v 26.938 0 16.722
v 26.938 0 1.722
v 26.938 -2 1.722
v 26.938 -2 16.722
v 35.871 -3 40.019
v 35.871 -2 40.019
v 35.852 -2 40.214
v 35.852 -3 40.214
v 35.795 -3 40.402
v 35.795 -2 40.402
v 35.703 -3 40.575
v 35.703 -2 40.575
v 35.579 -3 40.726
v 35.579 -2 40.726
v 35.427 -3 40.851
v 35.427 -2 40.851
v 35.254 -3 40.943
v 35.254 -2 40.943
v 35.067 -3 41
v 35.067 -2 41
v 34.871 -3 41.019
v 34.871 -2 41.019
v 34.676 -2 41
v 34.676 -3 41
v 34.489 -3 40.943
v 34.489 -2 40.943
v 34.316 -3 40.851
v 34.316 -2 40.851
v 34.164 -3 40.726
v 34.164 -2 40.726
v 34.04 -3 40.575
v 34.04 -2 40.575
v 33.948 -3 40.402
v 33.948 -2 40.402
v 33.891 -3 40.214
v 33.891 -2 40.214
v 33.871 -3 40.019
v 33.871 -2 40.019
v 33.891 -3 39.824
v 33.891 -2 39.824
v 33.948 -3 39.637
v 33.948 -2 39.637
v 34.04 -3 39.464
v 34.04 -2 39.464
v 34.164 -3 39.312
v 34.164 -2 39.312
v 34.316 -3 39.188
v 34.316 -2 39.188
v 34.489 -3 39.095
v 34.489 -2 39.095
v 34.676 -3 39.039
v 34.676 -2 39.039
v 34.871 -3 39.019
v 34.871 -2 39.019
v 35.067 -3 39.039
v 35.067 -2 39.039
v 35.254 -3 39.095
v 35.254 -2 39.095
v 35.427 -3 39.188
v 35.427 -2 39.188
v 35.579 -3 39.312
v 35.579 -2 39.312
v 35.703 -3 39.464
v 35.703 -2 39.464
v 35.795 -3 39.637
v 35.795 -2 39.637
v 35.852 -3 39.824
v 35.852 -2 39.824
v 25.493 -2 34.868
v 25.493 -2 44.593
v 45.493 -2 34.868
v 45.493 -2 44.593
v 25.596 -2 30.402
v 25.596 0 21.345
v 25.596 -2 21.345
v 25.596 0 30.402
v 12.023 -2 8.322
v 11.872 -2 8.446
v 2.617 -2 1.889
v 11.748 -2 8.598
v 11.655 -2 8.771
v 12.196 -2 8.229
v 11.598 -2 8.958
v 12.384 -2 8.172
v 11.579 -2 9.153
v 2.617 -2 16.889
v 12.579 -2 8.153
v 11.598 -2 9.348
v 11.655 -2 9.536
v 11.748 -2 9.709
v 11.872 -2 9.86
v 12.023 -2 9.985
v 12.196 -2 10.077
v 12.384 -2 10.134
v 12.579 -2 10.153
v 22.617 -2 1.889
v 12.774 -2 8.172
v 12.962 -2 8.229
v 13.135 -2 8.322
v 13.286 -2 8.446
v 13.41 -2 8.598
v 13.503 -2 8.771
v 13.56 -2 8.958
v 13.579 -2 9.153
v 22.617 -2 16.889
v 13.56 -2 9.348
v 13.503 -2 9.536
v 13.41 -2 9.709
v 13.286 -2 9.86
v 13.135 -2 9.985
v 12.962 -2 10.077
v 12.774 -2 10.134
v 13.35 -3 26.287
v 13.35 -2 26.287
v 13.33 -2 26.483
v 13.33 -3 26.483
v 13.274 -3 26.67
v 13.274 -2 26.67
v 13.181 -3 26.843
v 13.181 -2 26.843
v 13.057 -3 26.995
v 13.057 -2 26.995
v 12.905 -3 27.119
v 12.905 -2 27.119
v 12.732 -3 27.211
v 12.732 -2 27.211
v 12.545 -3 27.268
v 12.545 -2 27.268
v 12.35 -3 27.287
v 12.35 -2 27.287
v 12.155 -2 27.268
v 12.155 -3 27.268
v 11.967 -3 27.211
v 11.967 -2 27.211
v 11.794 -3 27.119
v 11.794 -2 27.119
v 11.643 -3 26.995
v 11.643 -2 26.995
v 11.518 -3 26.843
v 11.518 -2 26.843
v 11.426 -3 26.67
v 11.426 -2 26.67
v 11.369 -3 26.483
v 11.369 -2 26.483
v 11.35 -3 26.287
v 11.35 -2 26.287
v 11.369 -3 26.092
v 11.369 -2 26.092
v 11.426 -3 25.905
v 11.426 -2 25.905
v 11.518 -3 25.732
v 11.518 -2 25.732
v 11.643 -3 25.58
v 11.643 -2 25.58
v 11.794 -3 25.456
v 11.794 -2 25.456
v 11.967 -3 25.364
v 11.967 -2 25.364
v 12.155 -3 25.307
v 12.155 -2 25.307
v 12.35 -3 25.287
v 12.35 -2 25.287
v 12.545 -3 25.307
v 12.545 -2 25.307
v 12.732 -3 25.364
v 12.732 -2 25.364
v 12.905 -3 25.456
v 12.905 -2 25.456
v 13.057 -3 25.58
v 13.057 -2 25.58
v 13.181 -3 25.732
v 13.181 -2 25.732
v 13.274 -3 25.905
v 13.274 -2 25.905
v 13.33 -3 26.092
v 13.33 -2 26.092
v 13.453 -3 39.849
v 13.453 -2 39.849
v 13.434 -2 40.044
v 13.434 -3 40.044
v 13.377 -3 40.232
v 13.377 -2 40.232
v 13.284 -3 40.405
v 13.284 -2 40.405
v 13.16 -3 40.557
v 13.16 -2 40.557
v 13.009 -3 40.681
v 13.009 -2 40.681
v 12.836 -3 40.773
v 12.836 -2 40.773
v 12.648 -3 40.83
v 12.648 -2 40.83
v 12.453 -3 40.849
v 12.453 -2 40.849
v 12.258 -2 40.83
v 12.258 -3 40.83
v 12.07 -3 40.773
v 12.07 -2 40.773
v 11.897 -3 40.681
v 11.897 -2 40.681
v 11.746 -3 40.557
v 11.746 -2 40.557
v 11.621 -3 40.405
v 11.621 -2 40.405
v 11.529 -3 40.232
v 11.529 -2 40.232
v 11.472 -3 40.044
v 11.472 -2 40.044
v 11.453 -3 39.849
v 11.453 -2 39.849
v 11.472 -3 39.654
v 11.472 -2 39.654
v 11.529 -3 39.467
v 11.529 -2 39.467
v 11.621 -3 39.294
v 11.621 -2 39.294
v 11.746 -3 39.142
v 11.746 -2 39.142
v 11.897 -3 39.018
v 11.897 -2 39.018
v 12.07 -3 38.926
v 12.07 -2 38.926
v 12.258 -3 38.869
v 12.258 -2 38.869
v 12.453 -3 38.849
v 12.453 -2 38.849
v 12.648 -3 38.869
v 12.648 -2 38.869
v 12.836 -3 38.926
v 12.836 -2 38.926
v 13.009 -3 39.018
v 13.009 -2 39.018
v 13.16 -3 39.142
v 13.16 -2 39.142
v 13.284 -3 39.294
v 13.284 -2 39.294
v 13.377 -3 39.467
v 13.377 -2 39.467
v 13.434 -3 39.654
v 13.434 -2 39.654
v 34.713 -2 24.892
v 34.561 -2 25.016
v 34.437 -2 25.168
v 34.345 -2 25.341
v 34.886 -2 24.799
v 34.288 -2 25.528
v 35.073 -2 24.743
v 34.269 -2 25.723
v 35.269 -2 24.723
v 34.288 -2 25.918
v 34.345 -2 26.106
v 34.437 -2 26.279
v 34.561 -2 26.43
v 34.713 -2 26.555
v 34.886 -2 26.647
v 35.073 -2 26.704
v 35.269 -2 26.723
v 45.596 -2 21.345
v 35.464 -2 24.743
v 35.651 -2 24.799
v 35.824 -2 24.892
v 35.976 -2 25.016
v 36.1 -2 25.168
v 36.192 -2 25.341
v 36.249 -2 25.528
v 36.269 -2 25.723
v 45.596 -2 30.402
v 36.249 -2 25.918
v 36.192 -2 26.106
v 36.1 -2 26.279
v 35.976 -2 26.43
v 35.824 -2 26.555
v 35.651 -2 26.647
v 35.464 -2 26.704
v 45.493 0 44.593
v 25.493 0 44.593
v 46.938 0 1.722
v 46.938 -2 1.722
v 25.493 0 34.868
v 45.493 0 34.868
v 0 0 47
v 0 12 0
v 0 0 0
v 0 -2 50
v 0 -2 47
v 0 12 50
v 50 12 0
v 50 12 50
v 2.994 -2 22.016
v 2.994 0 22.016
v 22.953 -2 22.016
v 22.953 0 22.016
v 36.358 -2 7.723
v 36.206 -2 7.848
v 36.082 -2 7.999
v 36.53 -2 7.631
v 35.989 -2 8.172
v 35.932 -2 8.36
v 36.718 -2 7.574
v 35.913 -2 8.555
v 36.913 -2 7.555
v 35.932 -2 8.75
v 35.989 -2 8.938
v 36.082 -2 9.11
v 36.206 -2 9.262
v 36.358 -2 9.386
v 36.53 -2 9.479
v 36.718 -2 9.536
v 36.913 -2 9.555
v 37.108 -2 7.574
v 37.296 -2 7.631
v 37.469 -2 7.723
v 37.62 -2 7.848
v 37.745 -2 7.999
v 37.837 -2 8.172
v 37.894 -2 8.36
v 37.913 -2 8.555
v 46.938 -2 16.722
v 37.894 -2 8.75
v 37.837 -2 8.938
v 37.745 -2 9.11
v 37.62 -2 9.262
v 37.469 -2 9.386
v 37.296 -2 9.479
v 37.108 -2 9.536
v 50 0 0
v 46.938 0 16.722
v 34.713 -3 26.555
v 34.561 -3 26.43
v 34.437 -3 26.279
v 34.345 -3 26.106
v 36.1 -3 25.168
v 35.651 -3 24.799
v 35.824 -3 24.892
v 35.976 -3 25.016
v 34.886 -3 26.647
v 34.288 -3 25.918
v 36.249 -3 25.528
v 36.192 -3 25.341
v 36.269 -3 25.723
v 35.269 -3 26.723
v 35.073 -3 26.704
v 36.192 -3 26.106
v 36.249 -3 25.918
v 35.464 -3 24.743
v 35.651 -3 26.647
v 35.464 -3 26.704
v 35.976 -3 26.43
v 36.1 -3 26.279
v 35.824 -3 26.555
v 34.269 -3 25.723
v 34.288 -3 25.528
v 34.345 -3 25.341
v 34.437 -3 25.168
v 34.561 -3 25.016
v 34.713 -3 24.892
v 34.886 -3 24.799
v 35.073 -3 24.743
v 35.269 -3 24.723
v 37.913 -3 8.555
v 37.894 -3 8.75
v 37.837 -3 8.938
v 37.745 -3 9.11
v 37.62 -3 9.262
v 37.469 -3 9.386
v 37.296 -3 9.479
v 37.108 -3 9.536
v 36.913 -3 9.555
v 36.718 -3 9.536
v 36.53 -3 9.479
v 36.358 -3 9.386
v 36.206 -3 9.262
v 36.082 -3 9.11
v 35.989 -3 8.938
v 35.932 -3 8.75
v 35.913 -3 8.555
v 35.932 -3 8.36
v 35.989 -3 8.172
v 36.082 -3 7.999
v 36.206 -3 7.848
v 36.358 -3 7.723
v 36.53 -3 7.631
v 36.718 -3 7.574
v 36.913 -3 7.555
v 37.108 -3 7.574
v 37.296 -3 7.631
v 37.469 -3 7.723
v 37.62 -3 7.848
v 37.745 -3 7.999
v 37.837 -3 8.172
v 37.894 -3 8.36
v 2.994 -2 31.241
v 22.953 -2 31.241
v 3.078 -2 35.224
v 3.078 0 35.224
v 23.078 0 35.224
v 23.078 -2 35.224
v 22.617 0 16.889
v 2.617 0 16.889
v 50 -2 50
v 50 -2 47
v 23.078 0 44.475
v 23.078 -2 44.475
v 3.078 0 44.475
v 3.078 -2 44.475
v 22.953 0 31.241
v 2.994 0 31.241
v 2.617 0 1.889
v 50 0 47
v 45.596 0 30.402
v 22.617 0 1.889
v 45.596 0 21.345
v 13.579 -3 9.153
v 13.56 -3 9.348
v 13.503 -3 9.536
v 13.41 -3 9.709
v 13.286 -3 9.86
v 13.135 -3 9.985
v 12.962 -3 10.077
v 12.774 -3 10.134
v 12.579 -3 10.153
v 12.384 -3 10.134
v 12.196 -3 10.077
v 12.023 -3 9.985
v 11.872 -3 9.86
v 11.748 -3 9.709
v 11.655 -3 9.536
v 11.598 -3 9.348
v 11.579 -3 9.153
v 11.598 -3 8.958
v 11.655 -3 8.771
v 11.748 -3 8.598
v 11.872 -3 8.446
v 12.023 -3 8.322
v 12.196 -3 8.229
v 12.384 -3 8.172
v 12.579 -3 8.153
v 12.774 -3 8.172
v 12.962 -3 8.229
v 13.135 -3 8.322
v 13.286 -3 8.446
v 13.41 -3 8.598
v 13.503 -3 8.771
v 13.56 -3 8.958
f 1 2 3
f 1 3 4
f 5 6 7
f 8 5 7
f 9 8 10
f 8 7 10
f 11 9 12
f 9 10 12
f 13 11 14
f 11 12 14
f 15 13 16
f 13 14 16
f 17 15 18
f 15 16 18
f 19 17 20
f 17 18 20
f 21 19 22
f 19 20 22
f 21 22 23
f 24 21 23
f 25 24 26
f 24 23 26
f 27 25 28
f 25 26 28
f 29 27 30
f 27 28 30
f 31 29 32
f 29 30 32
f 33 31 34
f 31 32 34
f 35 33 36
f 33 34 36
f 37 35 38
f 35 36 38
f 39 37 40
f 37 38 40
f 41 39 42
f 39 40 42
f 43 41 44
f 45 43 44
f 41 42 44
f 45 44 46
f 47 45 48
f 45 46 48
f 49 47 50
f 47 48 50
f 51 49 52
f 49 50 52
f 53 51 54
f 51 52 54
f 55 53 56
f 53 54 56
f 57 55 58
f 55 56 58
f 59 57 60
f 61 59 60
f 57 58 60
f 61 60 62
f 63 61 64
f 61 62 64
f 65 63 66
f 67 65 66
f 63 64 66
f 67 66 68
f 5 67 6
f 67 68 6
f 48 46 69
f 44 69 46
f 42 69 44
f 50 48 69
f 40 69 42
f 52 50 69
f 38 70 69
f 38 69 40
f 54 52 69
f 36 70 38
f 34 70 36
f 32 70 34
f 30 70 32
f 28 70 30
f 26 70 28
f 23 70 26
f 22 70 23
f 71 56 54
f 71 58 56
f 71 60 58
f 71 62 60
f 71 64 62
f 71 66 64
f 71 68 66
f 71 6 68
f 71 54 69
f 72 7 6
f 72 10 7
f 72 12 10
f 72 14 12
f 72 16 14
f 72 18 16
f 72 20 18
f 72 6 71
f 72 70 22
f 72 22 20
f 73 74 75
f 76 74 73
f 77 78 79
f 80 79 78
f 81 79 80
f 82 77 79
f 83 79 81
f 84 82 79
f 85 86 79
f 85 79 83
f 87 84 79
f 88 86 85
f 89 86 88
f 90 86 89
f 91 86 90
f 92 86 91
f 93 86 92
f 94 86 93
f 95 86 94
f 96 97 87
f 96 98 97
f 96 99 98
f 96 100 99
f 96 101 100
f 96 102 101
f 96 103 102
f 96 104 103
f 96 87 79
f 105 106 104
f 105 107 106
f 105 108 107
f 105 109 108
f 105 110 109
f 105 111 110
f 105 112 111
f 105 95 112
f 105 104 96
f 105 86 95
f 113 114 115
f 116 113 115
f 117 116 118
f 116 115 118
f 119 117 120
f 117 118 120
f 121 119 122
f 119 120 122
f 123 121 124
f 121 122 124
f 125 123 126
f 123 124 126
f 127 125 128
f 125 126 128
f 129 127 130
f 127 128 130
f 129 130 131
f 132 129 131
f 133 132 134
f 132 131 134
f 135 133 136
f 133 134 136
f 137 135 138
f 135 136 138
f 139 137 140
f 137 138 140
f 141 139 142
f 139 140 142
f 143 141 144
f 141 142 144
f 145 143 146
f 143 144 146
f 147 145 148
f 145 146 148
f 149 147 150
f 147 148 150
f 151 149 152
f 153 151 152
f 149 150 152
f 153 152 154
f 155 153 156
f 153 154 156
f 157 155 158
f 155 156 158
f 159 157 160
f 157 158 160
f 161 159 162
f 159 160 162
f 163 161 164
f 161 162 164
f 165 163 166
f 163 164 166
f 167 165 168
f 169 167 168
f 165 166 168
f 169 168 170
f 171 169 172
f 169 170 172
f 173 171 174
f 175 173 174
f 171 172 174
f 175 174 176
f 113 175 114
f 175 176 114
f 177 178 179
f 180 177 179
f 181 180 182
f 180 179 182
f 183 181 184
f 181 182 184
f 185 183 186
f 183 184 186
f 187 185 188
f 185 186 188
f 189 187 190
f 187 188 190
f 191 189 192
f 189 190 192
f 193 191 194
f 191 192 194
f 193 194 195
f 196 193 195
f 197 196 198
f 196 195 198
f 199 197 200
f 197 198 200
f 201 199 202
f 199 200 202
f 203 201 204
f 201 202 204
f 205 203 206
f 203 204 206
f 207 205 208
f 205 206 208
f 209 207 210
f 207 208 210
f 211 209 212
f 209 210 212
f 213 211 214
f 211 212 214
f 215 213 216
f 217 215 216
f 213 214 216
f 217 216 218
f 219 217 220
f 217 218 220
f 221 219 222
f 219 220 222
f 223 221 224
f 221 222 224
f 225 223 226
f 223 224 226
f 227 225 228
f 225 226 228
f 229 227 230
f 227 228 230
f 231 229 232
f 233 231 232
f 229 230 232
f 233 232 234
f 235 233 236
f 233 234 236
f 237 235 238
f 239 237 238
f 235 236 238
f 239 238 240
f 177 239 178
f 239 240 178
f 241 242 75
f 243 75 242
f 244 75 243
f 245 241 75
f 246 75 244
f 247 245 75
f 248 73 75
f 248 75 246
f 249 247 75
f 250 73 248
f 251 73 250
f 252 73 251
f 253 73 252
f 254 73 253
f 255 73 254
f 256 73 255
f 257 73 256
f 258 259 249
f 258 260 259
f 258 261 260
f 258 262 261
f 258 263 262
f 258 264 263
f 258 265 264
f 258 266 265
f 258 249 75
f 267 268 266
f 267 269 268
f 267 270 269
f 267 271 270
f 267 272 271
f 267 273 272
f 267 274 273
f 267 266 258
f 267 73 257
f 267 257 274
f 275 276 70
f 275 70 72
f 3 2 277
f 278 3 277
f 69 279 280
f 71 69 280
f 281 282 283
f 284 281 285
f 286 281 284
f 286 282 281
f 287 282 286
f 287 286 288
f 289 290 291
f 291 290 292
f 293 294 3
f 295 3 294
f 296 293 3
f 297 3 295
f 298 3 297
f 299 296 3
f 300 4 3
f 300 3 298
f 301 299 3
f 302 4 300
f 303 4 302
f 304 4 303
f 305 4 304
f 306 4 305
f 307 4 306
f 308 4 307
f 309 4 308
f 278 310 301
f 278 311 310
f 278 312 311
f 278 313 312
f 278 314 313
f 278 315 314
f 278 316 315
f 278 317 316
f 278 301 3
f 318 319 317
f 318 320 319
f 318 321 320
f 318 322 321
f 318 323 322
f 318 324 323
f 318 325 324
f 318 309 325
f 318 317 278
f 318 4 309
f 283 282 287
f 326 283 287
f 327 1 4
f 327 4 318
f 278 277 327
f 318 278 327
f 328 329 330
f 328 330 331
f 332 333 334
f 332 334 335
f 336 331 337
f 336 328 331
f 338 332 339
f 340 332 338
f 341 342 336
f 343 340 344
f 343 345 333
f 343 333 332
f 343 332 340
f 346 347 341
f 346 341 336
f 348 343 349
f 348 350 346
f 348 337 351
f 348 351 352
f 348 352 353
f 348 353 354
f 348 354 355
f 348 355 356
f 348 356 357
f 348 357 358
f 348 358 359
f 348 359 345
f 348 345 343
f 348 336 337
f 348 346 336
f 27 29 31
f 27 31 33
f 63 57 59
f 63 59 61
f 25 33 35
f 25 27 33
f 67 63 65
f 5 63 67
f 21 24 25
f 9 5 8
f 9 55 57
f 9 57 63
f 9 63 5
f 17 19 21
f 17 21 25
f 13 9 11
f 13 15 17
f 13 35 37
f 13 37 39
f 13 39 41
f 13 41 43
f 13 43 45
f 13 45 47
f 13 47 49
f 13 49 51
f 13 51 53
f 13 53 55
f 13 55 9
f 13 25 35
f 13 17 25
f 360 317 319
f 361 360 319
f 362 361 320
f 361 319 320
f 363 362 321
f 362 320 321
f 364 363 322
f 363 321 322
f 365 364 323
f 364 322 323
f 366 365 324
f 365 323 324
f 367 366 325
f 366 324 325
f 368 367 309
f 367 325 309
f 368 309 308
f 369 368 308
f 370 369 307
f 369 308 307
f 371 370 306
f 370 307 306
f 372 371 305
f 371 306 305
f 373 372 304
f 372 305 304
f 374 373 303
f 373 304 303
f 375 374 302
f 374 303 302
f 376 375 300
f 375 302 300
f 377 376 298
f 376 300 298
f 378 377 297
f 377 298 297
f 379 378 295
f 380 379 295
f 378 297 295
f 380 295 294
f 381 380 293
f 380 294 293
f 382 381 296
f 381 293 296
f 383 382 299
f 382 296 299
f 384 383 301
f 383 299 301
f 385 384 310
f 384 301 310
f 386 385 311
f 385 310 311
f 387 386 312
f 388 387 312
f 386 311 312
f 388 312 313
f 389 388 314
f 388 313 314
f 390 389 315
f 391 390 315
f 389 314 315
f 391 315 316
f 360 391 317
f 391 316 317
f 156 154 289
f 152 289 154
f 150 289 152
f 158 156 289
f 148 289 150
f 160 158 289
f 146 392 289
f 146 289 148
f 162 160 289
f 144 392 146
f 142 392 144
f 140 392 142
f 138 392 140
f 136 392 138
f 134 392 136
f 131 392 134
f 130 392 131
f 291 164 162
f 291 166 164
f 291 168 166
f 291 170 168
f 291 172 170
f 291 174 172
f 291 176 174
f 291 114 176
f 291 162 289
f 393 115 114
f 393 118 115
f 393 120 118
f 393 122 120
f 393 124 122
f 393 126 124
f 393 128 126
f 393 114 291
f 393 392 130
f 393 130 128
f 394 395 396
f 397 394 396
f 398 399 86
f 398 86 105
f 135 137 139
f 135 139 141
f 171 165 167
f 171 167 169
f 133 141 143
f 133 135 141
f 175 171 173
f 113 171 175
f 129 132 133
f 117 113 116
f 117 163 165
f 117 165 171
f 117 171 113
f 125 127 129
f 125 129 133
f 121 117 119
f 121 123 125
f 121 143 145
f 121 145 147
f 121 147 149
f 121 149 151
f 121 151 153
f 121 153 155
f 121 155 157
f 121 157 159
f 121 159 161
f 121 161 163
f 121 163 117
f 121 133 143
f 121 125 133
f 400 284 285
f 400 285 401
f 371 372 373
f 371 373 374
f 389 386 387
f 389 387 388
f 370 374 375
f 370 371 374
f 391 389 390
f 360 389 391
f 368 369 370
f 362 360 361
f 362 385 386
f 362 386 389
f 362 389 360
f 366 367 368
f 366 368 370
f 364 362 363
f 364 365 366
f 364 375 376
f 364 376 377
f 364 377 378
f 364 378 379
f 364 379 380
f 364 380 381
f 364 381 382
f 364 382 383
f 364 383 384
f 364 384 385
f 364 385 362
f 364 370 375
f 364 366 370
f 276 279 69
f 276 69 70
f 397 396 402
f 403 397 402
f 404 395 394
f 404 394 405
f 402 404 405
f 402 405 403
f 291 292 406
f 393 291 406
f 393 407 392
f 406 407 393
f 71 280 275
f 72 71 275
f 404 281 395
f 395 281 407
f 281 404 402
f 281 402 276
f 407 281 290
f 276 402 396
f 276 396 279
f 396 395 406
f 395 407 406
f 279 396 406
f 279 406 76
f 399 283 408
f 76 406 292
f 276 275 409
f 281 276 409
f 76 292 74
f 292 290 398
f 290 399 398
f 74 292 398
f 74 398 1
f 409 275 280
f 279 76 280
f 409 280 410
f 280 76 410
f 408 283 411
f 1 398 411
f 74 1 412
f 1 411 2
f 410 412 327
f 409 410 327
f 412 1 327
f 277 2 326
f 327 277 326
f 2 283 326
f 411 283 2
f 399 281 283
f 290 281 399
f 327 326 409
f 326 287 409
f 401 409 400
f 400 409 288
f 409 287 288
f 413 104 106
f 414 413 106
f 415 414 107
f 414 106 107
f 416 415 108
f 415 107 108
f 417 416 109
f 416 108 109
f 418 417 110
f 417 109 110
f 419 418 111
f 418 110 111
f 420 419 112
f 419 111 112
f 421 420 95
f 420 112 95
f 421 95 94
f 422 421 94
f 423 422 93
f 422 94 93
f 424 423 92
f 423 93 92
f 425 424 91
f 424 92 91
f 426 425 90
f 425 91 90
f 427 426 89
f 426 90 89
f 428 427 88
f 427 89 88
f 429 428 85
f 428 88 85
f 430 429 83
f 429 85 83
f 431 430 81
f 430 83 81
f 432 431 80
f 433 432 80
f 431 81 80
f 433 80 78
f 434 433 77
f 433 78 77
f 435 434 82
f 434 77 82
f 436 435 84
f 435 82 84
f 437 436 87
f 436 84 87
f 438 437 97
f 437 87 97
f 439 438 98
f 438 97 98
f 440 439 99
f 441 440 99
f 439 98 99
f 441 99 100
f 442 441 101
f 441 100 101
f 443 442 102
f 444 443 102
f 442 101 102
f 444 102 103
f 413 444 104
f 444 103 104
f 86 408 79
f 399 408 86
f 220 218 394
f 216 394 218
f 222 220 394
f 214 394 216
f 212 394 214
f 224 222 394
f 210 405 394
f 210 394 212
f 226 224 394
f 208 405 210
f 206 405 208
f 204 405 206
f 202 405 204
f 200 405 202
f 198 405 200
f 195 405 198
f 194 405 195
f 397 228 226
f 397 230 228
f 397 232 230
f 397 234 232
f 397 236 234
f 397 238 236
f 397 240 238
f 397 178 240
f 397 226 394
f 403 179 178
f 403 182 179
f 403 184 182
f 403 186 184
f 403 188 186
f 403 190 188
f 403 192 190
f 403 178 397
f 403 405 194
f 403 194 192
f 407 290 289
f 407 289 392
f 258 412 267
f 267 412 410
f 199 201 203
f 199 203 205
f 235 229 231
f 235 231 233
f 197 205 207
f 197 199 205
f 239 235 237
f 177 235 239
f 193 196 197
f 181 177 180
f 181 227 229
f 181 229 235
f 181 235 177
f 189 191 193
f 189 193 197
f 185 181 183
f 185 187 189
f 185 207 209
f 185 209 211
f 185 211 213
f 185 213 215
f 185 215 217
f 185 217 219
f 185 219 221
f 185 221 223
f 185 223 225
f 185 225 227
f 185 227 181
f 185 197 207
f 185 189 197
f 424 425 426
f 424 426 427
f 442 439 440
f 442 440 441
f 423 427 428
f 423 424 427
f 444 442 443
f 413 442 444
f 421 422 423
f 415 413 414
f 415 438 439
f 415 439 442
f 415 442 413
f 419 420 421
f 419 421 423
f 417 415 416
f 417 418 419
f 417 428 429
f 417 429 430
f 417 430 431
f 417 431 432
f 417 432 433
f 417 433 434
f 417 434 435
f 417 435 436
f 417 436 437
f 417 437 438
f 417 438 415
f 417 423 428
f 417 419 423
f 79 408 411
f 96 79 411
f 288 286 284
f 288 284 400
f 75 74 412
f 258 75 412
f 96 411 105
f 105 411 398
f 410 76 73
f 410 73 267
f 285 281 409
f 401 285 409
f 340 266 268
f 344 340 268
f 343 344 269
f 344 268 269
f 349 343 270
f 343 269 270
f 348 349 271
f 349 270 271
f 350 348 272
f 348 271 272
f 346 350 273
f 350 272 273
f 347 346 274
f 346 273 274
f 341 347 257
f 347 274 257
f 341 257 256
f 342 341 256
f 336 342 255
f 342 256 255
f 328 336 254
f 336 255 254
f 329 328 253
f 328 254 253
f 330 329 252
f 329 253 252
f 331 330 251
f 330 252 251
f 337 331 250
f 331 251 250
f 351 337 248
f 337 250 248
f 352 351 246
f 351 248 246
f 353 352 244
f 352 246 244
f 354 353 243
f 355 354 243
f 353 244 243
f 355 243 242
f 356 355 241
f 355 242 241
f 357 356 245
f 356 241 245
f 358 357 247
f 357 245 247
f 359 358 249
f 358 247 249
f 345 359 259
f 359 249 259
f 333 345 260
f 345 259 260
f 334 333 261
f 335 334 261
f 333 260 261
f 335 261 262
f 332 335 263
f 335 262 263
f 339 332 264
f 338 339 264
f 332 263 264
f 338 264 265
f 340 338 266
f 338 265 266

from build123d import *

# Parameters (mm, degrees)
F0_W      = 50
F0_H      = 12
F1_DEPTH  = 50
F3_W      = 20
F3_H      = 9.72515
F4_DEPTH  = 2
F2_W      = 20
F2_H      = 9.250753
F5_DEPTH  = 2
F6_W      = 19.959261
F6_H      = 9.224868
F7_DEPTH  = 2
F8_W      = 20
F8_H      = 9.057143
F9_DEPTH  = 2
F10_W     = 20
F10_H     = 15
F11_DEPTH = 2
F12_W     = 20
F12_H     = 15
F13_DEPTH = 2
F14_R     = 1
F15_DEPTH = 1
F16_W     = 50
F16_H     = 3
F17_DEPTH = 2
F18_R     = 1
F19_DEPTH = 1
F20_R     = 1
F21_DEPTH = 1
F22_R     = 1
F23_DEPTH = 1
F24_R     = 1
F25_DEPTH = 1


with BuildPart() as f1:
    # F0 (on Top) → F1 (new body)
    with BuildSketch(Plane.XY):
        with Locations((25, 6)):
            Rectangle(F0_W, F0_H)
    extrude(amount=F1_DEPTH)

    # F3 (on face) → F4 (join)
    with BuildSketch(Plane.XZ):
        with Locations((35.493044, 39.7308)):
            Rectangle(F3_W, F3_H)
    extrude(amount=F4_DEPTH)

    # F2 (on face) → F5 (join)
    with BuildSketch(Plane.XZ):
        with Locations((13.077754, 39.849401)):
            Rectangle(F2_W, F2_H)
    extrude(amount=F5_DEPTH)

    # F6 (on face) → F7 (join)
    with BuildSketch(Plane.XZ):
        with Locations((12.97327, 26.628648)):
            Rectangle(F6_W, F6_H)
    extrude(amount=F7_DEPTH)

    # F8 (on face) → F9 (join)
    with BuildSketch(Plane.XZ):
        with Locations((35.595761, 25.873886)):
            Rectangle(F8_W, F8_H)
    extrude(amount=F9_DEPTH)

    # F10 (on face) → F11 (join)
    with BuildSketch(Plane.XZ):
        with Locations((12.617452, 9.389227)):
            Rectangle(F10_W, F10_H)
    extrude(amount=F11_DEPTH)

    # F12 (on face) → F13 (join)
    with BuildSketch(Plane.XZ):
        with Locations((36.937559, 9.221502)):
            Rectangle(F12_W, F12_H)
    extrude(amount=F13_DEPTH)

    # F14 (on face) → F15 (join)
    with BuildSketch(Plane.XZ.offset(2)):
        with Locations((12.452937, 39.849401)):
            Circle(F14_R)
    extrude(amount=F15_DEPTH)

    # F16 (on face) → F17 (join)
    with BuildSketch(Plane.XZ):
        with Locations((25, 48.5)):
            Rectangle(F16_W, F16_H)
    extrude(amount=F17_DEPTH)

    # F18 (on face) → F19 (join)
    with BuildSketch(Plane.XZ.offset(2)):
        with Locations((34.871425, 40.019318)):
            Circle(F18_R)
    extrude(amount=F19_DEPTH)

    # F20 (on face) → F21 (join)
    with BuildSketch(Plane.XZ.offset(2)):
        with Locations((12.349669, 26.287466)):
            Circle(F20_R)
    extrude(amount=F21_DEPTH)

    # F22 (on face) → F23 (join)
    with BuildSketch(Plane.XZ.offset(2)):
        with Locations((35.268549, 25.72331)):
            Circle(F22_R)
    extrude(amount=F23_DEPTH)

    # F24 (on face) → F25 (join)
    with BuildSketch(Plane.XZ.offset(2)):
        with Locations((12.578998, 9.153273)):
            Circle(F24_R)
        with Locations((36.913071, 8.554894)):
            Circle(F24_R)
    extrude(amount=F25_DEPTH)


solid = f1.part
